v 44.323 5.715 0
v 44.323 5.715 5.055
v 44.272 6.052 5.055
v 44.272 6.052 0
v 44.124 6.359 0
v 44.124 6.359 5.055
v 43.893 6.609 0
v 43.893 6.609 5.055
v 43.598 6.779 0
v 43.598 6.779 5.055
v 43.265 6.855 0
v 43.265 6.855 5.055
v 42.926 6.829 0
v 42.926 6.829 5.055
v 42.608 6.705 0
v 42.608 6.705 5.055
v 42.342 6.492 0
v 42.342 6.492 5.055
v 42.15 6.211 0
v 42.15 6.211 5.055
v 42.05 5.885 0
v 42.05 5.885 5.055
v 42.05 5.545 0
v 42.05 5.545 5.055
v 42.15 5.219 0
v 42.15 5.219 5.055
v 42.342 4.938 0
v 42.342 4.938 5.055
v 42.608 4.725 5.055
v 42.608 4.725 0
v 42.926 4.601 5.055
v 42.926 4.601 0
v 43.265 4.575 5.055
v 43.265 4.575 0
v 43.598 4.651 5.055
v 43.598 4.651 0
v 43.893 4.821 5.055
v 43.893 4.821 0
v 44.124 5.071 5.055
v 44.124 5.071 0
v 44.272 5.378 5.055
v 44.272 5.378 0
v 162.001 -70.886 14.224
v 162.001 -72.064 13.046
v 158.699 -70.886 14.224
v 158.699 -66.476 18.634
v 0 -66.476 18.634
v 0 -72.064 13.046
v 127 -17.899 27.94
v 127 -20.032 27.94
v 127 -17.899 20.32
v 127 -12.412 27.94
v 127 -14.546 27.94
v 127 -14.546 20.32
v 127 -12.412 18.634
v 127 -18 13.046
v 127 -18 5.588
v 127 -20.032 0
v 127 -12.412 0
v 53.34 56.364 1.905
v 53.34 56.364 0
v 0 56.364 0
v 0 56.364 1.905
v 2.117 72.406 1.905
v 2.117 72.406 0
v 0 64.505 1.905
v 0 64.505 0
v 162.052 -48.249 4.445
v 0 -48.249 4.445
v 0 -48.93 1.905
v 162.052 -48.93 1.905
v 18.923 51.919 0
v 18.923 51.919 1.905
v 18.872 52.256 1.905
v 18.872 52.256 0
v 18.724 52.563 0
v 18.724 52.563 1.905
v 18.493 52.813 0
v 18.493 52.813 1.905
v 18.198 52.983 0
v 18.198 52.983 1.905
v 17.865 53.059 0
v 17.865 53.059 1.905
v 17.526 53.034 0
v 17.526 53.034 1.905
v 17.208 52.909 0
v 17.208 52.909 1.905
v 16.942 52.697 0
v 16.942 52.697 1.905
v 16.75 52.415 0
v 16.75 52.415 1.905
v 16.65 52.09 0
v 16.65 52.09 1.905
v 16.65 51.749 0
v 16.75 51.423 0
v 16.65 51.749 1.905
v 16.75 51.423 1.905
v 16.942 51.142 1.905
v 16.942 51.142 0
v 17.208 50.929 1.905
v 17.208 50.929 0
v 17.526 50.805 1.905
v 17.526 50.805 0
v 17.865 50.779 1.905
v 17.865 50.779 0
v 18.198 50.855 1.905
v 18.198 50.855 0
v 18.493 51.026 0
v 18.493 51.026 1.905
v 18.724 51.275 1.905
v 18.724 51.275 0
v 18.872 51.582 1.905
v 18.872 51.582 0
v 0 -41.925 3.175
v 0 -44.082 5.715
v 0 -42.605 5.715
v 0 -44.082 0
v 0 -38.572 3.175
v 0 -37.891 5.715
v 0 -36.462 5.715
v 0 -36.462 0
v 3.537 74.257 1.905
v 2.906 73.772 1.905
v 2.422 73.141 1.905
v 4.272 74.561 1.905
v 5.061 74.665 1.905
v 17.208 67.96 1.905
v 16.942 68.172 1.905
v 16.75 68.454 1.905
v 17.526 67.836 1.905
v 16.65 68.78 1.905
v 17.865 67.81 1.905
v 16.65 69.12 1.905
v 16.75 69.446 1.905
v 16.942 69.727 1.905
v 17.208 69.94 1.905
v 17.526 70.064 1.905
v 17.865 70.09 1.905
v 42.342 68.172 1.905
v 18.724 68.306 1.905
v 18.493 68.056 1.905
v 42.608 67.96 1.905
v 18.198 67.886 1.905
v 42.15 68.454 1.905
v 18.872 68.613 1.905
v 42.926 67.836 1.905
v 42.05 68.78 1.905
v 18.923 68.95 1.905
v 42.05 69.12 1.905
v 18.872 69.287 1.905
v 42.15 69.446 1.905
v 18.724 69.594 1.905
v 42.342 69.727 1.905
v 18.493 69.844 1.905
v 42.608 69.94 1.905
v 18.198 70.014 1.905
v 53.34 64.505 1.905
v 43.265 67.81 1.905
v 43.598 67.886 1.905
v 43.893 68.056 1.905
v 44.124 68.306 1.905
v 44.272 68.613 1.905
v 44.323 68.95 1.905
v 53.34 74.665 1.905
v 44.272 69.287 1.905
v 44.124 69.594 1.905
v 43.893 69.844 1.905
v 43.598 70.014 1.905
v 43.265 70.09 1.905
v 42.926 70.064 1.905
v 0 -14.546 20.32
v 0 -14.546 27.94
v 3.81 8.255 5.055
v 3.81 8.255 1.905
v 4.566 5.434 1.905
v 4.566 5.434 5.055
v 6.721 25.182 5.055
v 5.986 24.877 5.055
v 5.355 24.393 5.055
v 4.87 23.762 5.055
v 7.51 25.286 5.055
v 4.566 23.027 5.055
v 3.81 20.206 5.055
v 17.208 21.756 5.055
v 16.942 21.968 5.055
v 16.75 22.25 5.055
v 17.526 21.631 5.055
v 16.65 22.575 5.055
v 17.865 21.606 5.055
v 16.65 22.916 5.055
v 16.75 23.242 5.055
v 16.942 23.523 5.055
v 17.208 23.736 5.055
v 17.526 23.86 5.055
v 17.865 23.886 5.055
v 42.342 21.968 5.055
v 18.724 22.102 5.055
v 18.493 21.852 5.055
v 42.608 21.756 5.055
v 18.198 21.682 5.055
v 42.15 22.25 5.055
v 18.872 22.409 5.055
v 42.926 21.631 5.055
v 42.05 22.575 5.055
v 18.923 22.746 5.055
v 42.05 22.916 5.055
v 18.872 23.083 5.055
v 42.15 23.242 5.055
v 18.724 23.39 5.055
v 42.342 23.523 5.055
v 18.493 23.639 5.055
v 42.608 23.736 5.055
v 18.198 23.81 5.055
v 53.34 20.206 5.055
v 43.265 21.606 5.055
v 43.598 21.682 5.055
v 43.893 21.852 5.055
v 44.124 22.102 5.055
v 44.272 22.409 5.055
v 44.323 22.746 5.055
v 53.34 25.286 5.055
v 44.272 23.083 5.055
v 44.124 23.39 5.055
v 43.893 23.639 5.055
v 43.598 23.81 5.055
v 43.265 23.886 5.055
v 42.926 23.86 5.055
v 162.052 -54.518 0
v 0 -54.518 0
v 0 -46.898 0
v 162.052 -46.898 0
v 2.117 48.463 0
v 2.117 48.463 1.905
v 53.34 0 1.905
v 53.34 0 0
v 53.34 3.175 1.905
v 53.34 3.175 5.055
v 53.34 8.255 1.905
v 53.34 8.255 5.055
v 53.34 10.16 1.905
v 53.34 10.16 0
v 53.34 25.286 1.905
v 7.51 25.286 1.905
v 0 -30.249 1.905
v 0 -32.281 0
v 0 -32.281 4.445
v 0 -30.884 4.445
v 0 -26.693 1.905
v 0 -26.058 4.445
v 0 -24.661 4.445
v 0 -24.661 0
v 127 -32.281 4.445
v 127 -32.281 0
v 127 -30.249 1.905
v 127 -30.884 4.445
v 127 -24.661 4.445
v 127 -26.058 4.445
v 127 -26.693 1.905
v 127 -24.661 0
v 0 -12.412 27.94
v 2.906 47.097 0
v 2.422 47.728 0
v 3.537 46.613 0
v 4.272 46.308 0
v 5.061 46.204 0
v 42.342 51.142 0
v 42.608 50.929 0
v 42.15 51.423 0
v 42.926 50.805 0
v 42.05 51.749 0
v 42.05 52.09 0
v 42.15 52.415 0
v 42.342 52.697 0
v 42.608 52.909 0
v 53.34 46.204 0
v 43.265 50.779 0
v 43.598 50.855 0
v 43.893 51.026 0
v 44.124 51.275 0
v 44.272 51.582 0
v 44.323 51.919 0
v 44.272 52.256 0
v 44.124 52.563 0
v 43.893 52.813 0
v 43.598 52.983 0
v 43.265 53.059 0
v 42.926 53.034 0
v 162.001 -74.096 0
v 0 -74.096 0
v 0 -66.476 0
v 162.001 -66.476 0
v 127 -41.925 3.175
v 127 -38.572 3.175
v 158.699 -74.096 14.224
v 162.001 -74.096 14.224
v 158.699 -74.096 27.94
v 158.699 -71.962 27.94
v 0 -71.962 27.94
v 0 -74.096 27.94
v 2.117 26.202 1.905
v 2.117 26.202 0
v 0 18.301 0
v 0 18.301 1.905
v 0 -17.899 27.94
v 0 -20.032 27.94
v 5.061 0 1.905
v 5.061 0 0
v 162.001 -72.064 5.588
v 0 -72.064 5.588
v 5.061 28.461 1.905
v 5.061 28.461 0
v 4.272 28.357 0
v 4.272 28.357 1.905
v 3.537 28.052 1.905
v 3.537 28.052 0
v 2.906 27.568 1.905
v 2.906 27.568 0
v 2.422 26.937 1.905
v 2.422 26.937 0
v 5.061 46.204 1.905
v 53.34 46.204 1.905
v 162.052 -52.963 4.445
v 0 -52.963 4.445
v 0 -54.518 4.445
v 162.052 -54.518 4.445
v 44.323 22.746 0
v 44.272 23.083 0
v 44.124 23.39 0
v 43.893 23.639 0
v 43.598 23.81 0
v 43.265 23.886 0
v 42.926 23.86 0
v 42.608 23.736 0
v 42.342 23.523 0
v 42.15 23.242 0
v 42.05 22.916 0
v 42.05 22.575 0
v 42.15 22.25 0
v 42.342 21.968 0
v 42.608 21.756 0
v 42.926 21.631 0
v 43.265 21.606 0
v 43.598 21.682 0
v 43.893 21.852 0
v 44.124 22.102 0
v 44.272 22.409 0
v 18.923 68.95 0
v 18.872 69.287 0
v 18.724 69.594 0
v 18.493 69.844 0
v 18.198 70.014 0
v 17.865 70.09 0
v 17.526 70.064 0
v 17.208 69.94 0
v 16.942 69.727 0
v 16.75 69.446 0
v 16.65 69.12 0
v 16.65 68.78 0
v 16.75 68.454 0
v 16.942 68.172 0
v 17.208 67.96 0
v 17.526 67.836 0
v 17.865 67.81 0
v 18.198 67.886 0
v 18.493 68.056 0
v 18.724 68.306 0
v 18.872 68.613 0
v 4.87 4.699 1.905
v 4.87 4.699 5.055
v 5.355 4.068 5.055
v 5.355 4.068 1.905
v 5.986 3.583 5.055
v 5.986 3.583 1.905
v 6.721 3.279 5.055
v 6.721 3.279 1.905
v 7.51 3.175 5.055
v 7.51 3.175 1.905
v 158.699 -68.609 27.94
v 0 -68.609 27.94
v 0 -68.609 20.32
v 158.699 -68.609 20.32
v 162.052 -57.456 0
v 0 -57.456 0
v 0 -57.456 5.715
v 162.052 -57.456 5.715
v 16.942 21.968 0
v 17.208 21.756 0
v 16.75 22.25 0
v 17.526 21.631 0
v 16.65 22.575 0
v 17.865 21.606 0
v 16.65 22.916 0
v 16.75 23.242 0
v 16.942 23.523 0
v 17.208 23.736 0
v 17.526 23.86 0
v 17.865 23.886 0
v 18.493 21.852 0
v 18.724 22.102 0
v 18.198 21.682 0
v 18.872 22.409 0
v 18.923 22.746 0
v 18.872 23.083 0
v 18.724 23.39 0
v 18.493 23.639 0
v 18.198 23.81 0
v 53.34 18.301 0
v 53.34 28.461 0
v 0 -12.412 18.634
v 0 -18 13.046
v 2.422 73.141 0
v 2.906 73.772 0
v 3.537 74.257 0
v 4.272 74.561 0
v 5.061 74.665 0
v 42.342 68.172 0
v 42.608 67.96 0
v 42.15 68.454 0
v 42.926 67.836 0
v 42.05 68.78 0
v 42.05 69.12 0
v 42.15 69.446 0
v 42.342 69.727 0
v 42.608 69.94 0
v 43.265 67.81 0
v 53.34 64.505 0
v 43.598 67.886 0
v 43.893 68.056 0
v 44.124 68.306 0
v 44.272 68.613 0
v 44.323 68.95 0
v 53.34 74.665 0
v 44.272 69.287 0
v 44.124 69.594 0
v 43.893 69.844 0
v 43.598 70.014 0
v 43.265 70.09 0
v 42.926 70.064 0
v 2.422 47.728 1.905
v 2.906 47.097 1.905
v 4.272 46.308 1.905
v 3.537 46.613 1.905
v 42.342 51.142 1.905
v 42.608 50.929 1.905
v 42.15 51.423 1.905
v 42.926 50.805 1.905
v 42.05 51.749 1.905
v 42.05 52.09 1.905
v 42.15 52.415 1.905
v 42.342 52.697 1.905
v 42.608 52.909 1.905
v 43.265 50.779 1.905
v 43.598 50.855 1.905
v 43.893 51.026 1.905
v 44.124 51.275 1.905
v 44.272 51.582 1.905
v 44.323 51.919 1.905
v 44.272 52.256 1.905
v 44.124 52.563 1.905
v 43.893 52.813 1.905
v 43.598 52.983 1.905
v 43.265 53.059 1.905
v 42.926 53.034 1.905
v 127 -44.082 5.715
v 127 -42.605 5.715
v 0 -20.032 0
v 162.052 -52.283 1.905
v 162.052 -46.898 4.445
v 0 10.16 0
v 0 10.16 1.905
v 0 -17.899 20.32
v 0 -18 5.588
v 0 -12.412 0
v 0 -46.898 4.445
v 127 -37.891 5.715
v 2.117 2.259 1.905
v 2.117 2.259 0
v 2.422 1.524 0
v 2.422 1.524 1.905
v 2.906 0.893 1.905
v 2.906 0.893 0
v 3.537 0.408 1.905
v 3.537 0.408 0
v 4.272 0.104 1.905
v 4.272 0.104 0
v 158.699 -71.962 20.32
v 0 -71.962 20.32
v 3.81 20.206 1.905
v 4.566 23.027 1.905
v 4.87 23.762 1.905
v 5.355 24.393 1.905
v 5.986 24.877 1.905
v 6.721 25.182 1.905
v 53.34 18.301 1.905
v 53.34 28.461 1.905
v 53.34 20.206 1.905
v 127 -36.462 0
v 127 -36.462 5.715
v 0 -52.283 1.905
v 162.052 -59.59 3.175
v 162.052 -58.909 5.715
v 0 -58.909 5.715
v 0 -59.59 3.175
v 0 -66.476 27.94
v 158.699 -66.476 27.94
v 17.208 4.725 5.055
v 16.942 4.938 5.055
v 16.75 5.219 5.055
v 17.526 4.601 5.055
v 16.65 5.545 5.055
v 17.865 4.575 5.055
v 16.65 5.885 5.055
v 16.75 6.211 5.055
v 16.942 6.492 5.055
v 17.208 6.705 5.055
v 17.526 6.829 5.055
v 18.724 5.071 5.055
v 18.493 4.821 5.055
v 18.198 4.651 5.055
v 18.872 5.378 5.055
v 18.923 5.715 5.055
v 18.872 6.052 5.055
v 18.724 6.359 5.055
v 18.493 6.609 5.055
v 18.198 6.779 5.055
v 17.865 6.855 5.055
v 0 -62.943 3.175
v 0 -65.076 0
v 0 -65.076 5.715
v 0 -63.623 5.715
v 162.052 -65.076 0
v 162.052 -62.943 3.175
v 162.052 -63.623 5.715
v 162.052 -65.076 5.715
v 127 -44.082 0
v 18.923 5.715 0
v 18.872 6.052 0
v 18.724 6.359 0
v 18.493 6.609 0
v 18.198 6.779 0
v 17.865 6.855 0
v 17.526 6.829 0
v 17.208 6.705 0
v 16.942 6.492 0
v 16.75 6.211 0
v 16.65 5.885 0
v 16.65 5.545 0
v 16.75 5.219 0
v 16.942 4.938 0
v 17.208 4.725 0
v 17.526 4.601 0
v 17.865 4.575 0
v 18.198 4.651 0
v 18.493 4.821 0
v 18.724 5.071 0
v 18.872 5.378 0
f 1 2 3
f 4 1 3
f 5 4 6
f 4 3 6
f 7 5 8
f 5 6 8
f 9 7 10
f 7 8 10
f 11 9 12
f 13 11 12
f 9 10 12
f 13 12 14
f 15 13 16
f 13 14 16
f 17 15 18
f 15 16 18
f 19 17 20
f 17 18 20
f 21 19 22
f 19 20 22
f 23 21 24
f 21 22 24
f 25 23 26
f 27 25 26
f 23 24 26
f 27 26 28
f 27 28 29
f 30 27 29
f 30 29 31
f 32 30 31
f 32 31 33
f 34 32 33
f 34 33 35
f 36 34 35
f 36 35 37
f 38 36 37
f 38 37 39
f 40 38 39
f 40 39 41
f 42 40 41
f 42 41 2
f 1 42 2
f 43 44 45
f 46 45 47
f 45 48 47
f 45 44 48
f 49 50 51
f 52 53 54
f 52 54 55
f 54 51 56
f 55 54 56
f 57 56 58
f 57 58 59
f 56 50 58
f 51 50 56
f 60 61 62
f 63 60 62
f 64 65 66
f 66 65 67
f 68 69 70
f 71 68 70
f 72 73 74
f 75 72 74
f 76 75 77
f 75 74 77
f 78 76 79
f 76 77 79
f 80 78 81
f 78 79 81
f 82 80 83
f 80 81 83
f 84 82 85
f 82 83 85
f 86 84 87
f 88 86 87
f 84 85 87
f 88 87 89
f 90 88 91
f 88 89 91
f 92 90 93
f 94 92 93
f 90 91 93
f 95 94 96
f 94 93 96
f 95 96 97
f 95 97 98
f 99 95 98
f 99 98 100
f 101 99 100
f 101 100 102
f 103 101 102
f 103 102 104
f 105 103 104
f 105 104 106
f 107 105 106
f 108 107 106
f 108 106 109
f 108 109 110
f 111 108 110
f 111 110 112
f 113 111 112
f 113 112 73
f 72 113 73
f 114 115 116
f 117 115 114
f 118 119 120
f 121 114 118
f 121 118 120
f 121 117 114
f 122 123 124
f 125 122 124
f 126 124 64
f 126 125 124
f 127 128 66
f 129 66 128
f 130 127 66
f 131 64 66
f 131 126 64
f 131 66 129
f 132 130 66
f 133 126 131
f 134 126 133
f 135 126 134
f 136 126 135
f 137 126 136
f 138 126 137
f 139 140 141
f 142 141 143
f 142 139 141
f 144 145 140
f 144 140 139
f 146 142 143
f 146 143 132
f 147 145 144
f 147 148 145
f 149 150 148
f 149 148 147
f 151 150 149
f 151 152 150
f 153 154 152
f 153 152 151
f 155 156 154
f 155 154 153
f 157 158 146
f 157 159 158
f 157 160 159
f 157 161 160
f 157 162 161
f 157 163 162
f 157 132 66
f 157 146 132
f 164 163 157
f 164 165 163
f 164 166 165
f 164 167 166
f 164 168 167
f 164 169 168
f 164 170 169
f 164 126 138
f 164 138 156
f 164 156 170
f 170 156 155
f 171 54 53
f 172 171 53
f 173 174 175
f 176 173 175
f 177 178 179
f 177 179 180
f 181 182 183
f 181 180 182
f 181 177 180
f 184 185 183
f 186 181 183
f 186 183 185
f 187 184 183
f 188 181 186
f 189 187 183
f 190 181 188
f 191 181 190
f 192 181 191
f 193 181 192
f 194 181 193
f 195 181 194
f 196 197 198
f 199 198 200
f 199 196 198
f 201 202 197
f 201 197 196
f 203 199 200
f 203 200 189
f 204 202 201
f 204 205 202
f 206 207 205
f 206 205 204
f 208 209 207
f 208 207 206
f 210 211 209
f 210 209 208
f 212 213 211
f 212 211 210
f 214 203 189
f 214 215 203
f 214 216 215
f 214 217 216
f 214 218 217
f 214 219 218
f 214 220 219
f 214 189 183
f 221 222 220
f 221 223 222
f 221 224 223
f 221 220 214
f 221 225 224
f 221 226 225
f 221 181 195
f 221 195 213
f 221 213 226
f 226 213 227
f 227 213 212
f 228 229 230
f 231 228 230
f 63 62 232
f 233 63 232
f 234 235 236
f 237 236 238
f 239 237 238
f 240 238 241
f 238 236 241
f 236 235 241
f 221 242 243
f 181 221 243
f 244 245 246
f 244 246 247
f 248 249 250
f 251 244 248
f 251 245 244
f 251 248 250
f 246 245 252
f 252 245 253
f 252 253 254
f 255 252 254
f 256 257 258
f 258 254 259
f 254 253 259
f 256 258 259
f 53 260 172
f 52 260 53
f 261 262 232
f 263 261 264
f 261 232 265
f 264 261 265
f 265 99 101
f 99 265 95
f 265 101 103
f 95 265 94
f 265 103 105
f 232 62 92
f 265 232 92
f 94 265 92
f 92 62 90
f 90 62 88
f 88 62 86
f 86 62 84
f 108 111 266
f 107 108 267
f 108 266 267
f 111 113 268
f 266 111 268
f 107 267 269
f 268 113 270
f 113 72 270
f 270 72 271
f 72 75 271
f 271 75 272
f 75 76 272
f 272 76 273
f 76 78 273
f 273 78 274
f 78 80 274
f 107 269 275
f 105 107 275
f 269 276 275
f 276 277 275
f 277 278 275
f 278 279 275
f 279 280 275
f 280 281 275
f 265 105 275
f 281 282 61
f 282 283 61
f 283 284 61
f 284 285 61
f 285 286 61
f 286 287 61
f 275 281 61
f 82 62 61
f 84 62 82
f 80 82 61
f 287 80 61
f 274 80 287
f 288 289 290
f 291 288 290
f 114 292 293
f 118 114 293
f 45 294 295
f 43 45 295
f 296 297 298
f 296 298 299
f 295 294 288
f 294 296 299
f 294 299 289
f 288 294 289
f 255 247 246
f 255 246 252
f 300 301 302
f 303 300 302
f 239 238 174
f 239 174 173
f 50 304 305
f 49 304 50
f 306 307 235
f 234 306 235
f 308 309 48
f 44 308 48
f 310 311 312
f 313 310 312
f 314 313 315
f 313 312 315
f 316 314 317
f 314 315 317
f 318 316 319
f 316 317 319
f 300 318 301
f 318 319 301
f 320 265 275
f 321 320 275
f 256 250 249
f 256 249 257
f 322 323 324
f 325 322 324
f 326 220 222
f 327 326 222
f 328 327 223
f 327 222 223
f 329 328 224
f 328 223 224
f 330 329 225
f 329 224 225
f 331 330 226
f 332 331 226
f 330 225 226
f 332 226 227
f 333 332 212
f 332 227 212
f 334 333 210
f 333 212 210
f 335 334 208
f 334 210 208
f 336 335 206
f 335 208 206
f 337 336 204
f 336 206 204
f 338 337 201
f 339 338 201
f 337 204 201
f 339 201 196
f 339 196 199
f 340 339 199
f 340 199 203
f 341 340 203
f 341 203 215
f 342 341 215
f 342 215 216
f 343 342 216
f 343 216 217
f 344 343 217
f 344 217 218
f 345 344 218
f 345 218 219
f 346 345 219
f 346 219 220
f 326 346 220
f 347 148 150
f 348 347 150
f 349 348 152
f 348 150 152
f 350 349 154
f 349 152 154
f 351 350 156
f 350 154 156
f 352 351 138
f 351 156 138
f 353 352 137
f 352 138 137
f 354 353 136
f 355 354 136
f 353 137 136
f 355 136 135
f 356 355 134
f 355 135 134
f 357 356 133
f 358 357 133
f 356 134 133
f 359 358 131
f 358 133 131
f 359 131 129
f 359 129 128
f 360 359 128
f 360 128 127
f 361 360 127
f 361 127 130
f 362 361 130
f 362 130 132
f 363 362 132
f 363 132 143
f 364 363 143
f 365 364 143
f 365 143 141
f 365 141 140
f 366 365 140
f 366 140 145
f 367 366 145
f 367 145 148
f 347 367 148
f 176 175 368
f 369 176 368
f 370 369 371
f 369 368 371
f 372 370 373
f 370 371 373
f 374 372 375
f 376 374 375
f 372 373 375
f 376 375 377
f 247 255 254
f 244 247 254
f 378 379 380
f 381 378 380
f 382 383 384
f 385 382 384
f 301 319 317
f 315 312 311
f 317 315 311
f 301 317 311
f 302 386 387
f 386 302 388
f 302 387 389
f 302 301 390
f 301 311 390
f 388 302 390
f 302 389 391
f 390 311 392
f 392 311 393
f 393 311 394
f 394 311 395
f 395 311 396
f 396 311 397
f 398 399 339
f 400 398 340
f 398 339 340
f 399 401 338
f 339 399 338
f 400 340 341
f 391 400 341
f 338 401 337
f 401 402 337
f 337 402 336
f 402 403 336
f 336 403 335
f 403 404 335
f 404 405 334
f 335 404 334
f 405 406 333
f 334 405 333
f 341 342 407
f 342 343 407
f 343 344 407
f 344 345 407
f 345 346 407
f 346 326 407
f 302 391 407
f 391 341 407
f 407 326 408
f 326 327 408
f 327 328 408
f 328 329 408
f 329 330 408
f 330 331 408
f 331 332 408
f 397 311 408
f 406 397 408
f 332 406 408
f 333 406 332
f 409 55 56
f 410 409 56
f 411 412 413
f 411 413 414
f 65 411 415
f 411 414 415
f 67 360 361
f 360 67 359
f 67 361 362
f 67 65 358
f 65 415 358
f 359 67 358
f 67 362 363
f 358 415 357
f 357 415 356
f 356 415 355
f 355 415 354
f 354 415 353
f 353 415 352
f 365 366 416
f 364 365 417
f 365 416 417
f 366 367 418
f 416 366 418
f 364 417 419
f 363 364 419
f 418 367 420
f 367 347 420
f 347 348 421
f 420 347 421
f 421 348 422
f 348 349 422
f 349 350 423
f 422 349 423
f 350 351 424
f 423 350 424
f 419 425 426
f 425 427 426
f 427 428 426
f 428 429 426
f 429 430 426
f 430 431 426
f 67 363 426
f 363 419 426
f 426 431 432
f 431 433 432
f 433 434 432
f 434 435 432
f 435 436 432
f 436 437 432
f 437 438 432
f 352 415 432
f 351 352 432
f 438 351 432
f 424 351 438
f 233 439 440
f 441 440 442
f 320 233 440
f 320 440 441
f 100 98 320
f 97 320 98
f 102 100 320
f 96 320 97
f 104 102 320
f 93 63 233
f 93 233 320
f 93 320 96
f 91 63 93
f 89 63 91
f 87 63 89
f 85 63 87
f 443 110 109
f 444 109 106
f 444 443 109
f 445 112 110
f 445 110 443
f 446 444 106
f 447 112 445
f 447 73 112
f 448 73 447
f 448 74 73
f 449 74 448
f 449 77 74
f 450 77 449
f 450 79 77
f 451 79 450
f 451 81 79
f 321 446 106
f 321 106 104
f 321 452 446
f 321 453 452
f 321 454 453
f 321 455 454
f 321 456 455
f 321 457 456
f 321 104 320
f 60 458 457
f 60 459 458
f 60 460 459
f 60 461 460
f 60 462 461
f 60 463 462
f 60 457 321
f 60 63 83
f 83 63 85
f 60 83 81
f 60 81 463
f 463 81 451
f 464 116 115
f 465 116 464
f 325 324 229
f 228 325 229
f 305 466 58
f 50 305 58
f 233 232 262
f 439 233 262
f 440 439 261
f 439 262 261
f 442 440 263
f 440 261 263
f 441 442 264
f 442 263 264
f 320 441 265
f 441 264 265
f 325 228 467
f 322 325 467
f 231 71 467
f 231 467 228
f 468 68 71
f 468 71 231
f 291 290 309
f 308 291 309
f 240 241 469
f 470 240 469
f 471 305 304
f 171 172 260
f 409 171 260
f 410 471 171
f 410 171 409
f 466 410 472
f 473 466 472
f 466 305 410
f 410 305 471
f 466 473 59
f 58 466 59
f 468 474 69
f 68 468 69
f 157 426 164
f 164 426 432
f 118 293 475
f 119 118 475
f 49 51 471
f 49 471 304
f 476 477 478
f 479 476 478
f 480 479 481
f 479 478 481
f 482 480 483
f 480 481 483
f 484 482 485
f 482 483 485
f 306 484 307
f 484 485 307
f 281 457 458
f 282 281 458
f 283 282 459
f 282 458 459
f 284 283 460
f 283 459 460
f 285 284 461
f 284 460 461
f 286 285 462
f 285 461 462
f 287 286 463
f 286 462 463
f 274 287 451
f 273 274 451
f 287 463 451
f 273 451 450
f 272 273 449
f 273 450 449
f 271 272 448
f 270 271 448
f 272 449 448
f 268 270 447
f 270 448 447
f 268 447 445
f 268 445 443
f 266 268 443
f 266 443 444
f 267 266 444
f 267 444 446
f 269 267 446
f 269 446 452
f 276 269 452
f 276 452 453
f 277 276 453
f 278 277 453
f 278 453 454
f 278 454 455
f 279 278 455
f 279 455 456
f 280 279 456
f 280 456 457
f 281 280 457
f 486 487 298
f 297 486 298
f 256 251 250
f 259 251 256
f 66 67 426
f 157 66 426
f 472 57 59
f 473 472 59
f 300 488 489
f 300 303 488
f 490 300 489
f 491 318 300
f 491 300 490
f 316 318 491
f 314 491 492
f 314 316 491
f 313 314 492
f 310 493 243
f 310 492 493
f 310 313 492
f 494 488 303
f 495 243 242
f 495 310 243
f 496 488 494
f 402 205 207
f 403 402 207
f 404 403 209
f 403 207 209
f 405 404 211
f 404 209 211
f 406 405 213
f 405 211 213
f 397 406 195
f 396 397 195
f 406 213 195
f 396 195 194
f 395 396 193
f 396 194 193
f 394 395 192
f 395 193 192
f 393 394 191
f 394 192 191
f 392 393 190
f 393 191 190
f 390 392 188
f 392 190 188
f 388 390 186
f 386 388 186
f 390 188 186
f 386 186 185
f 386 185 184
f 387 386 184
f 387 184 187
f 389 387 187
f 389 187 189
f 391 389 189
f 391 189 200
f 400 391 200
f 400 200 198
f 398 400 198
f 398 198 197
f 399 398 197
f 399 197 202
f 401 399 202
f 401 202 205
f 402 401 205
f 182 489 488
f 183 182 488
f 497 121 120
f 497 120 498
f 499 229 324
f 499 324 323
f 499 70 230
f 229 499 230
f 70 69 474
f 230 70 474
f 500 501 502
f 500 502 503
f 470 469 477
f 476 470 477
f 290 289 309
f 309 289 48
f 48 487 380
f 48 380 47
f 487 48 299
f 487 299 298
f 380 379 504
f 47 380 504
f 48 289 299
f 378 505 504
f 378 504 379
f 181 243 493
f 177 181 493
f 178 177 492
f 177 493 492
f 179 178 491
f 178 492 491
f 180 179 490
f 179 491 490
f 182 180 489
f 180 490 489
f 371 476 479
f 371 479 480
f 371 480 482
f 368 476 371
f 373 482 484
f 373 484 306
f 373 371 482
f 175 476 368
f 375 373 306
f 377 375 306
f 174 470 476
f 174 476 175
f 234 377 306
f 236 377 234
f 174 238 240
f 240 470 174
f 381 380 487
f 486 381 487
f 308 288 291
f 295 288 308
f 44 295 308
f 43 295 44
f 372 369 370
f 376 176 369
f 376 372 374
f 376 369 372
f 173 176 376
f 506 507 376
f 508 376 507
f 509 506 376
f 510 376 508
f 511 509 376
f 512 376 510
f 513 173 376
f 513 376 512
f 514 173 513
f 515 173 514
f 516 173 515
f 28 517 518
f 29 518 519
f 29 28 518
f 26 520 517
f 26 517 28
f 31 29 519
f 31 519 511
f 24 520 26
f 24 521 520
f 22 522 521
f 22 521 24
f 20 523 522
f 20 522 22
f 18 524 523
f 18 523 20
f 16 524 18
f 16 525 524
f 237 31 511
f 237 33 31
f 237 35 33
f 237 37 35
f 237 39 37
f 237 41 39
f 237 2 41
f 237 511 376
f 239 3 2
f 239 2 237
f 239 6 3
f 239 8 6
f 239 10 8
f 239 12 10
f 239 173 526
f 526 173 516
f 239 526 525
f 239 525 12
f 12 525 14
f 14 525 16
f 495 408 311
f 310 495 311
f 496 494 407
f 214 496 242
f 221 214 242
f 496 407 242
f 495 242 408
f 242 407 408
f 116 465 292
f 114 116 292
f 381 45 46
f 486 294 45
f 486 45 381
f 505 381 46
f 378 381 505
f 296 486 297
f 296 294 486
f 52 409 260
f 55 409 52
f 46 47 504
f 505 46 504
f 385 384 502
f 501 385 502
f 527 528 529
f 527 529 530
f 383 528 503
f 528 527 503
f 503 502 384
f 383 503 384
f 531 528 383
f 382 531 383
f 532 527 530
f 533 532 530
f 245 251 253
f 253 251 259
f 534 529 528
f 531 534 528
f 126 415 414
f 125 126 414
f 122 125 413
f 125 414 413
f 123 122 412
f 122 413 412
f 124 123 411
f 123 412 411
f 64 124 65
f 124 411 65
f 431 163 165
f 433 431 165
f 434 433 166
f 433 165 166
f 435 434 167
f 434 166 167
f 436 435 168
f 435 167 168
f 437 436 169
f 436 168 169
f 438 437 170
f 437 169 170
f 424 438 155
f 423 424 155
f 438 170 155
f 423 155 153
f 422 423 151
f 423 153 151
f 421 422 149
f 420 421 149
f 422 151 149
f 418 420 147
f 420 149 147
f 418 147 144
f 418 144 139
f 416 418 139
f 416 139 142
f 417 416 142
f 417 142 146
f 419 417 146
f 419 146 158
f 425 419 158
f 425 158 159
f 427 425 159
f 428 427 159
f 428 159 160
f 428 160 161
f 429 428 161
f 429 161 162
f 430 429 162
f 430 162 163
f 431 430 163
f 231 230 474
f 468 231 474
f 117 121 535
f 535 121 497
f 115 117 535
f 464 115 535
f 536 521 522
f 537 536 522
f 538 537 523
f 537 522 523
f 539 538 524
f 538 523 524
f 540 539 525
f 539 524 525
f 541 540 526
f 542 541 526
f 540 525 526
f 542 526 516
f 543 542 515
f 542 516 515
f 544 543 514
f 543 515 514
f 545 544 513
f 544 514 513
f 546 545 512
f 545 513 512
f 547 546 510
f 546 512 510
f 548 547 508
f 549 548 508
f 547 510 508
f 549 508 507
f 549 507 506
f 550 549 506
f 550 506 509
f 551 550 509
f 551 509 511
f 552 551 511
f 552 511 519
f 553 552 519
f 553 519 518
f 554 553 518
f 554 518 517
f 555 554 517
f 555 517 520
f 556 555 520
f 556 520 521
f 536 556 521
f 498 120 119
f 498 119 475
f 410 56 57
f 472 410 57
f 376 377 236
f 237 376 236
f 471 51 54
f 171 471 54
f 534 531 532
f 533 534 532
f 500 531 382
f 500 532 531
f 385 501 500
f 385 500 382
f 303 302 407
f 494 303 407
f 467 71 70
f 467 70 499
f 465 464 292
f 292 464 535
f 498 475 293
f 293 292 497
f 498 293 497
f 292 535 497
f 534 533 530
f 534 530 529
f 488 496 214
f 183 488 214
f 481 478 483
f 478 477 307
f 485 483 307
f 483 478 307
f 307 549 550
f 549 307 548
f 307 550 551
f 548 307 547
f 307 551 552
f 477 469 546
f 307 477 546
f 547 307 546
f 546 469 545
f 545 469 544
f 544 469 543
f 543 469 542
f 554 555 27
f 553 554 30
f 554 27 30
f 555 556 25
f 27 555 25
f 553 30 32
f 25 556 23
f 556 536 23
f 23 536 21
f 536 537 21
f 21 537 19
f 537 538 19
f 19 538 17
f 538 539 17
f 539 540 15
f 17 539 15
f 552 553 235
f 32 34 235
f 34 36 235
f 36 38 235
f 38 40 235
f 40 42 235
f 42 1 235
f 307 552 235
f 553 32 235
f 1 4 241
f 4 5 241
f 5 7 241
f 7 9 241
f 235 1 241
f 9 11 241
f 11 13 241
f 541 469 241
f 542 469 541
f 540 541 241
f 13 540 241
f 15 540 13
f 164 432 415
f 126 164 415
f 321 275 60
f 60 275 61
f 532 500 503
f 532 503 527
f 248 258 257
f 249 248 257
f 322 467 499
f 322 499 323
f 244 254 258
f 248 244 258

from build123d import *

# Parameters (mm, degrees)
F1_DEPTH  = 1.905
F3_DEPTH  = 3.1496
F4_W      = 1.905
F4_H      = 3.1496
F5_DEPTH  = 50.0414432116
F6_R      = 1.143
F7_DEPTH  = 5.0556
F8_W      = 127
F8_H      = 7.62
F9_DEPTH  = 27.94
F10_W     = 3.3528
F10_H     = 7.62
F11_DEPTH = 127
F12_W     = 127
F12_H     = 7.62
F13_DEPTH = 4.445
F15_DEPTH = 127
F16_W     = 127
F16_H     = 7.62
F17_DEPTH = 5.715
F19_DEPTH = 127
F21_DEPTH = 162.0012
F22_W     = 3.302
F22_H     = 13.716
F23_DEPTH = 7.62
F25_DEPTH = 162.052


with BuildPart() as f1:
    # F0 (on Top) → F1 (new body)
    with BuildSketch(Plane.XY):
        with BuildLine():
            ThreePointArc((2.1170345359, 2.2591195505), (3.2056716188, 0.6298590188), (5.0611764545, 0))
            Line((5.0611764545, 0), (53.34, 0))
            Line((53.34, 0), (53.34, 10.16))
            Line((53.34, 10.16), (0, 10.16))
            Line((0, 10.16), (2.1170345359, 2.2591195505))
        make_face()
    extrude(amount=F1_DEPTH)

    # F2 (on face) → F3 (join)
    with BuildSketch(Plane.XY.offset(1.905)):
        with BuildLine():
            Line((53.34, 3.175), (53.34, 10.16))
            Line((53.34, 10.16), (3.2995567884, 10.16))
            Line((3.2995567884, 10.16), (4.5658526384, 5.4341195505))
            ThreePointArc((4.5658526384, 5.4341195505), (5.6544897213, 3.8048590188), (7.5099945569, 3.175))
            Line((7.5099945569, 3.175), (53.34, 3.175))
        make_face()
    extrude(amount=F3_DEPTH)


with BuildPart() as f1b:
    # F0 (on Top) → F1, piece 2 (new body)
    with BuildSketch(Plane.XY):
        with BuildLine():
            Line((2.1170345359, 26.2016345311), (0, 18.3007540816))
            Line((0, 18.3007540816), (53.34, 18.3007540816))
            Line((53.34, 18.3007540816), (53.34, 28.4607540816))
            Line((53.34, 28.4607540816), (5.0611764545, 28.4607540816))
            ThreePointArc((5.0611764545, 28.4607540816), (3.2056716188, 27.8308950628), (2.1170345359, 26.2016345311))
        make_face()
    extrude(amount=F1_DEPTH)

    # F2 (on face) → F3, piece 2 (join)
    with BuildSketch(Plane.XY.offset(1.905)):
        with BuildLine():
            Line((3.2995567884, 18.3007540816), (53.34, 18.3007540816))
            Line((53.34, 18.3007540816), (53.34, 25.2857540816))
            Line((53.34, 25.2857540816), (7.5099945569, 25.2857540816))
            ThreePointArc((7.5099945569, 25.2857540816), (5.6544897213, 24.6558950628), (4.5658526384, 23.0266345311))
            Line((4.5658526384, 23.0266345311), (3.2995567884, 18.3007540816))
        make_face()
    extrude(amount=F3_DEPTH)


with BuildPart() as f1c:
    # F0 (on Top) → F1, piece 3 (new body)
    with BuildSketch(Plane.XY):
        with BuildLine():
            ThreePointArc((2.1170345359, 48.4632860374), (3.2056716188, 46.8340255057), (5.0611764545, 46.2041664869))
            Line((5.0611764545, 46.2041664869), (53.34, 46.2041664869))
            Line((53.34, 46.2041664869), (53.34, 56.3641664869))
            Line((53.34, 56.3641664869), (0, 56.3641664869))
            Line((0, 56.3641664869), (2.1170345359, 48.4632860374))
        make_face()
    extrude(amount=F1_DEPTH)


with BuildPart() as f1d:
    # F0 (on Top) → F1, piece 4 (new body)
    with BuildSketch(Plane.XY):
        with BuildLine():
            Line((2.1170345359, 72.4058010179), (0, 64.5049205685))
            Line((0, 64.5049205685), (53.34, 64.5049205685))
            Line((53.34, 64.5049205685), (53.34, 74.6649205685))
            Line((53.34, 74.6649205685), (5.0611764545, 74.6649205685))
            ThreePointArc((5.0611764545, 74.6649205685), (3.2056716188, 74.0350615497), (2.1170345359, 72.4058010179))
        make_face()
    extrude(amount=F1_DEPTH)


with BuildPart() as f5_tool:
    # F4 (on face) → F5 (new body, through all)
    with BuildSketch(Plane.YZ.offset(53.34)):
        with Locations((9.2075, 3.4798)):
            Rectangle(F4_W, F4_H)
        with Locations((19.2532540816, 3.4798)):
            Rectangle(F4_W, F4_H)
    extrude(amount=-F5_DEPTH)


with BuildPart() as f1_1:
    add(f1.part)

    # F5: cut by f5_tool
    add(f5_tool.part, mode=Mode.SUBTRACT)


with BuildPart() as f1b_1:
    add(f1b.part)

    # F5: cut by f5_tool
    add(f5_tool.part, mode=Mode.SUBTRACT)


with BuildPart() as f7_tool:
    # F6 (on face) → F7 (new body, through all)
    with BuildSketch(Plane.XY.offset(5.0546)):
        with Locations((17.78, 5.715)):
            Circle(F6_R)
        with Locations((43.18, 5.715)):
            Circle(F6_R)
        with Locations((17.78, 22.7457540816)):
            Circle(F6_R)
        with Locations((43.18, 22.7457540816)):
            Circle(F6_R)
        with Locations((17.78, 51.9191664869)):
            Circle(F6_R)
        with Locations((43.18, 51.9191664869)):
            Circle(F6_R)
        with Locations((43.18, 68.9499205685)):
            Circle(F6_R)
        with Locations((17.78, 68.9499205685)):
            Circle(F6_R)
    extrude(amount=-F7_DEPTH)


with BuildPart() as f1_2:
    add(f1_1.part)

    # F7: cut by f7_tool
    add(f7_tool.part, mode=Mode.SUBTRACT)


with BuildPart() as f1b_2:
    add(f1b_1.part)

    # F7: cut by f7_tool
    add(f7_tool.part, mode=Mode.SUBTRACT)


with BuildPart() as f1c_1:
    add(f1c.part)

    # F7: cut by f7_tool
    add(f7_tool.part, mode=Mode.SUBTRACT)


with BuildPart() as f1d_1:
    add(f1d.part)

    # F7: cut by f7_tool
    add(f7_tool.part, mode=Mode.SUBTRACT)


with BuildPart() as f9:
    # F8 (on Top) → F9 (new body)
    with BuildSketch(Plane.XY):
        with Locations((63.5, -16.2223329405)):
            Rectangle(F8_W, F8_H)
    extrude(amount=F9_DEPTH)

    # F10 (on face) → F11 (cut, through all)
    with BuildSketch(Plane.YZ.offset(127)):
        with Locations((-16.2223329405, 24.13)):
            Rectangle(F10_W, F10_H)
        Polygon((-12.4123329405, 0), (-12.4123329405, 18.6340653542), (-18.0003329405, 13.0460653542), (-18.0003329405, 5.588), align=None)
    extrude(amount=-F11_DEPTH, mode=Mode.SUBTRACT)


with BuildPart() as f13:
    # F12 (on Top) → F13 (new body)
    with BuildSketch(Plane.XY):
        with Locations((63.5, -28.4705040316)):
            Rectangle(F12_W, F12_H)
    extrude(amount=F13_DEPTH)

    # F14 (on face) → F15 (cut, through all)
    with BuildSketch(Plane.YZ.offset(127)):
        Polygon((-26.0575040316, 4.445), (-30.8835040316, 4.445), (-30.2485040316, 1.905), (-26.6925040316, 1.905), align=None)
    extrude(amount=-F15_DEPTH, mode=Mode.SUBTRACT)


with BuildPart() as f17:
    # F16 (on Top) → F17 (new body)
    with BuildSketch(Plane.XY):
        with Locations((63.5, -40.2722206438)):
            Rectangle(F16_W, F16_H)
    extrude(amount=F17_DEPTH)

    # F18 (on face) → F19 (cut, through all)
    with BuildSketch(Plane.YZ.offset(127)):
        Polygon((-37.8914739333, 5.715), (-42.6054558309, 5.715), (-41.9248648821, 3.175), (-38.5720648821, 3.175), align=None)
    extrude(amount=-F19_DEPTH, mode=Mode.SUBTRACT)


with BuildPart() as f21:
    # F20 (on Right) → F21 (new body)
    with BuildSketch(Plane.YZ):
        Polygon((-66.47579819, 18.6340653542), (-66.47579819, 27.94), (-68.60939819, 27.94), (-68.60939819, 20.32), (-71.96219819, 20.32), (-71.96219819, 27.94), (-74.09579819, 27.94), (-74.09579819, 0), (-66.47579819, 0), (-72.06379819, 5.588), (-72.06379819, 13.0460653542), align=None)
    extrude(amount=F21_DEPTH)

    # F22 (on face) → F23 (cut)
    with BuildSketch(Plane.XZ.offset(74.09579819)):
        with Locations((160.3502, 21.082)):
            Rectangle(F22_W, F22_H)
    extrude(amount=-F23_DEPTH, mode=Mode.SUBTRACT)


with BuildPart() as f25:
    # F24 (on Right) → F25 (new body)
    with BuildSketch(Plane.YZ):
        Polygon((-54.5178402128, 0), (-46.8978402128, 0), (-46.8978402128, 4.445), (-48.249249264, 4.445), (-48.9298402128, 1.905), (-52.2826402128, 1.905), (-52.9632311615, 4.445), (-54.5178402128, 4.445), align=None)
    extrude(amount=F25_DEPTH)


with BuildPart() as f25b:
    # F24 (on Right) → F25, piece 2 (new body)
    with BuildSketch(Plane.YZ):
        Polygon((-65.0763807163, 0), (-57.4563807163, 0), (-57.4563807163, 5.715), (-58.9093897676, 5.715), (-59.5899807163, 3.175), (-62.9427807163, 3.175), (-63.6233716651, 5.715), (-65.0763807163, 5.715), align=None)
    extrude(amount=F25_DEPTH)


solid = Compound([f1_2.part, f1b_2.part, f1c_1.part, f1d_1.part, f9.part, f13.part, f17.part, f21.part, f25.part, f25b.part])
